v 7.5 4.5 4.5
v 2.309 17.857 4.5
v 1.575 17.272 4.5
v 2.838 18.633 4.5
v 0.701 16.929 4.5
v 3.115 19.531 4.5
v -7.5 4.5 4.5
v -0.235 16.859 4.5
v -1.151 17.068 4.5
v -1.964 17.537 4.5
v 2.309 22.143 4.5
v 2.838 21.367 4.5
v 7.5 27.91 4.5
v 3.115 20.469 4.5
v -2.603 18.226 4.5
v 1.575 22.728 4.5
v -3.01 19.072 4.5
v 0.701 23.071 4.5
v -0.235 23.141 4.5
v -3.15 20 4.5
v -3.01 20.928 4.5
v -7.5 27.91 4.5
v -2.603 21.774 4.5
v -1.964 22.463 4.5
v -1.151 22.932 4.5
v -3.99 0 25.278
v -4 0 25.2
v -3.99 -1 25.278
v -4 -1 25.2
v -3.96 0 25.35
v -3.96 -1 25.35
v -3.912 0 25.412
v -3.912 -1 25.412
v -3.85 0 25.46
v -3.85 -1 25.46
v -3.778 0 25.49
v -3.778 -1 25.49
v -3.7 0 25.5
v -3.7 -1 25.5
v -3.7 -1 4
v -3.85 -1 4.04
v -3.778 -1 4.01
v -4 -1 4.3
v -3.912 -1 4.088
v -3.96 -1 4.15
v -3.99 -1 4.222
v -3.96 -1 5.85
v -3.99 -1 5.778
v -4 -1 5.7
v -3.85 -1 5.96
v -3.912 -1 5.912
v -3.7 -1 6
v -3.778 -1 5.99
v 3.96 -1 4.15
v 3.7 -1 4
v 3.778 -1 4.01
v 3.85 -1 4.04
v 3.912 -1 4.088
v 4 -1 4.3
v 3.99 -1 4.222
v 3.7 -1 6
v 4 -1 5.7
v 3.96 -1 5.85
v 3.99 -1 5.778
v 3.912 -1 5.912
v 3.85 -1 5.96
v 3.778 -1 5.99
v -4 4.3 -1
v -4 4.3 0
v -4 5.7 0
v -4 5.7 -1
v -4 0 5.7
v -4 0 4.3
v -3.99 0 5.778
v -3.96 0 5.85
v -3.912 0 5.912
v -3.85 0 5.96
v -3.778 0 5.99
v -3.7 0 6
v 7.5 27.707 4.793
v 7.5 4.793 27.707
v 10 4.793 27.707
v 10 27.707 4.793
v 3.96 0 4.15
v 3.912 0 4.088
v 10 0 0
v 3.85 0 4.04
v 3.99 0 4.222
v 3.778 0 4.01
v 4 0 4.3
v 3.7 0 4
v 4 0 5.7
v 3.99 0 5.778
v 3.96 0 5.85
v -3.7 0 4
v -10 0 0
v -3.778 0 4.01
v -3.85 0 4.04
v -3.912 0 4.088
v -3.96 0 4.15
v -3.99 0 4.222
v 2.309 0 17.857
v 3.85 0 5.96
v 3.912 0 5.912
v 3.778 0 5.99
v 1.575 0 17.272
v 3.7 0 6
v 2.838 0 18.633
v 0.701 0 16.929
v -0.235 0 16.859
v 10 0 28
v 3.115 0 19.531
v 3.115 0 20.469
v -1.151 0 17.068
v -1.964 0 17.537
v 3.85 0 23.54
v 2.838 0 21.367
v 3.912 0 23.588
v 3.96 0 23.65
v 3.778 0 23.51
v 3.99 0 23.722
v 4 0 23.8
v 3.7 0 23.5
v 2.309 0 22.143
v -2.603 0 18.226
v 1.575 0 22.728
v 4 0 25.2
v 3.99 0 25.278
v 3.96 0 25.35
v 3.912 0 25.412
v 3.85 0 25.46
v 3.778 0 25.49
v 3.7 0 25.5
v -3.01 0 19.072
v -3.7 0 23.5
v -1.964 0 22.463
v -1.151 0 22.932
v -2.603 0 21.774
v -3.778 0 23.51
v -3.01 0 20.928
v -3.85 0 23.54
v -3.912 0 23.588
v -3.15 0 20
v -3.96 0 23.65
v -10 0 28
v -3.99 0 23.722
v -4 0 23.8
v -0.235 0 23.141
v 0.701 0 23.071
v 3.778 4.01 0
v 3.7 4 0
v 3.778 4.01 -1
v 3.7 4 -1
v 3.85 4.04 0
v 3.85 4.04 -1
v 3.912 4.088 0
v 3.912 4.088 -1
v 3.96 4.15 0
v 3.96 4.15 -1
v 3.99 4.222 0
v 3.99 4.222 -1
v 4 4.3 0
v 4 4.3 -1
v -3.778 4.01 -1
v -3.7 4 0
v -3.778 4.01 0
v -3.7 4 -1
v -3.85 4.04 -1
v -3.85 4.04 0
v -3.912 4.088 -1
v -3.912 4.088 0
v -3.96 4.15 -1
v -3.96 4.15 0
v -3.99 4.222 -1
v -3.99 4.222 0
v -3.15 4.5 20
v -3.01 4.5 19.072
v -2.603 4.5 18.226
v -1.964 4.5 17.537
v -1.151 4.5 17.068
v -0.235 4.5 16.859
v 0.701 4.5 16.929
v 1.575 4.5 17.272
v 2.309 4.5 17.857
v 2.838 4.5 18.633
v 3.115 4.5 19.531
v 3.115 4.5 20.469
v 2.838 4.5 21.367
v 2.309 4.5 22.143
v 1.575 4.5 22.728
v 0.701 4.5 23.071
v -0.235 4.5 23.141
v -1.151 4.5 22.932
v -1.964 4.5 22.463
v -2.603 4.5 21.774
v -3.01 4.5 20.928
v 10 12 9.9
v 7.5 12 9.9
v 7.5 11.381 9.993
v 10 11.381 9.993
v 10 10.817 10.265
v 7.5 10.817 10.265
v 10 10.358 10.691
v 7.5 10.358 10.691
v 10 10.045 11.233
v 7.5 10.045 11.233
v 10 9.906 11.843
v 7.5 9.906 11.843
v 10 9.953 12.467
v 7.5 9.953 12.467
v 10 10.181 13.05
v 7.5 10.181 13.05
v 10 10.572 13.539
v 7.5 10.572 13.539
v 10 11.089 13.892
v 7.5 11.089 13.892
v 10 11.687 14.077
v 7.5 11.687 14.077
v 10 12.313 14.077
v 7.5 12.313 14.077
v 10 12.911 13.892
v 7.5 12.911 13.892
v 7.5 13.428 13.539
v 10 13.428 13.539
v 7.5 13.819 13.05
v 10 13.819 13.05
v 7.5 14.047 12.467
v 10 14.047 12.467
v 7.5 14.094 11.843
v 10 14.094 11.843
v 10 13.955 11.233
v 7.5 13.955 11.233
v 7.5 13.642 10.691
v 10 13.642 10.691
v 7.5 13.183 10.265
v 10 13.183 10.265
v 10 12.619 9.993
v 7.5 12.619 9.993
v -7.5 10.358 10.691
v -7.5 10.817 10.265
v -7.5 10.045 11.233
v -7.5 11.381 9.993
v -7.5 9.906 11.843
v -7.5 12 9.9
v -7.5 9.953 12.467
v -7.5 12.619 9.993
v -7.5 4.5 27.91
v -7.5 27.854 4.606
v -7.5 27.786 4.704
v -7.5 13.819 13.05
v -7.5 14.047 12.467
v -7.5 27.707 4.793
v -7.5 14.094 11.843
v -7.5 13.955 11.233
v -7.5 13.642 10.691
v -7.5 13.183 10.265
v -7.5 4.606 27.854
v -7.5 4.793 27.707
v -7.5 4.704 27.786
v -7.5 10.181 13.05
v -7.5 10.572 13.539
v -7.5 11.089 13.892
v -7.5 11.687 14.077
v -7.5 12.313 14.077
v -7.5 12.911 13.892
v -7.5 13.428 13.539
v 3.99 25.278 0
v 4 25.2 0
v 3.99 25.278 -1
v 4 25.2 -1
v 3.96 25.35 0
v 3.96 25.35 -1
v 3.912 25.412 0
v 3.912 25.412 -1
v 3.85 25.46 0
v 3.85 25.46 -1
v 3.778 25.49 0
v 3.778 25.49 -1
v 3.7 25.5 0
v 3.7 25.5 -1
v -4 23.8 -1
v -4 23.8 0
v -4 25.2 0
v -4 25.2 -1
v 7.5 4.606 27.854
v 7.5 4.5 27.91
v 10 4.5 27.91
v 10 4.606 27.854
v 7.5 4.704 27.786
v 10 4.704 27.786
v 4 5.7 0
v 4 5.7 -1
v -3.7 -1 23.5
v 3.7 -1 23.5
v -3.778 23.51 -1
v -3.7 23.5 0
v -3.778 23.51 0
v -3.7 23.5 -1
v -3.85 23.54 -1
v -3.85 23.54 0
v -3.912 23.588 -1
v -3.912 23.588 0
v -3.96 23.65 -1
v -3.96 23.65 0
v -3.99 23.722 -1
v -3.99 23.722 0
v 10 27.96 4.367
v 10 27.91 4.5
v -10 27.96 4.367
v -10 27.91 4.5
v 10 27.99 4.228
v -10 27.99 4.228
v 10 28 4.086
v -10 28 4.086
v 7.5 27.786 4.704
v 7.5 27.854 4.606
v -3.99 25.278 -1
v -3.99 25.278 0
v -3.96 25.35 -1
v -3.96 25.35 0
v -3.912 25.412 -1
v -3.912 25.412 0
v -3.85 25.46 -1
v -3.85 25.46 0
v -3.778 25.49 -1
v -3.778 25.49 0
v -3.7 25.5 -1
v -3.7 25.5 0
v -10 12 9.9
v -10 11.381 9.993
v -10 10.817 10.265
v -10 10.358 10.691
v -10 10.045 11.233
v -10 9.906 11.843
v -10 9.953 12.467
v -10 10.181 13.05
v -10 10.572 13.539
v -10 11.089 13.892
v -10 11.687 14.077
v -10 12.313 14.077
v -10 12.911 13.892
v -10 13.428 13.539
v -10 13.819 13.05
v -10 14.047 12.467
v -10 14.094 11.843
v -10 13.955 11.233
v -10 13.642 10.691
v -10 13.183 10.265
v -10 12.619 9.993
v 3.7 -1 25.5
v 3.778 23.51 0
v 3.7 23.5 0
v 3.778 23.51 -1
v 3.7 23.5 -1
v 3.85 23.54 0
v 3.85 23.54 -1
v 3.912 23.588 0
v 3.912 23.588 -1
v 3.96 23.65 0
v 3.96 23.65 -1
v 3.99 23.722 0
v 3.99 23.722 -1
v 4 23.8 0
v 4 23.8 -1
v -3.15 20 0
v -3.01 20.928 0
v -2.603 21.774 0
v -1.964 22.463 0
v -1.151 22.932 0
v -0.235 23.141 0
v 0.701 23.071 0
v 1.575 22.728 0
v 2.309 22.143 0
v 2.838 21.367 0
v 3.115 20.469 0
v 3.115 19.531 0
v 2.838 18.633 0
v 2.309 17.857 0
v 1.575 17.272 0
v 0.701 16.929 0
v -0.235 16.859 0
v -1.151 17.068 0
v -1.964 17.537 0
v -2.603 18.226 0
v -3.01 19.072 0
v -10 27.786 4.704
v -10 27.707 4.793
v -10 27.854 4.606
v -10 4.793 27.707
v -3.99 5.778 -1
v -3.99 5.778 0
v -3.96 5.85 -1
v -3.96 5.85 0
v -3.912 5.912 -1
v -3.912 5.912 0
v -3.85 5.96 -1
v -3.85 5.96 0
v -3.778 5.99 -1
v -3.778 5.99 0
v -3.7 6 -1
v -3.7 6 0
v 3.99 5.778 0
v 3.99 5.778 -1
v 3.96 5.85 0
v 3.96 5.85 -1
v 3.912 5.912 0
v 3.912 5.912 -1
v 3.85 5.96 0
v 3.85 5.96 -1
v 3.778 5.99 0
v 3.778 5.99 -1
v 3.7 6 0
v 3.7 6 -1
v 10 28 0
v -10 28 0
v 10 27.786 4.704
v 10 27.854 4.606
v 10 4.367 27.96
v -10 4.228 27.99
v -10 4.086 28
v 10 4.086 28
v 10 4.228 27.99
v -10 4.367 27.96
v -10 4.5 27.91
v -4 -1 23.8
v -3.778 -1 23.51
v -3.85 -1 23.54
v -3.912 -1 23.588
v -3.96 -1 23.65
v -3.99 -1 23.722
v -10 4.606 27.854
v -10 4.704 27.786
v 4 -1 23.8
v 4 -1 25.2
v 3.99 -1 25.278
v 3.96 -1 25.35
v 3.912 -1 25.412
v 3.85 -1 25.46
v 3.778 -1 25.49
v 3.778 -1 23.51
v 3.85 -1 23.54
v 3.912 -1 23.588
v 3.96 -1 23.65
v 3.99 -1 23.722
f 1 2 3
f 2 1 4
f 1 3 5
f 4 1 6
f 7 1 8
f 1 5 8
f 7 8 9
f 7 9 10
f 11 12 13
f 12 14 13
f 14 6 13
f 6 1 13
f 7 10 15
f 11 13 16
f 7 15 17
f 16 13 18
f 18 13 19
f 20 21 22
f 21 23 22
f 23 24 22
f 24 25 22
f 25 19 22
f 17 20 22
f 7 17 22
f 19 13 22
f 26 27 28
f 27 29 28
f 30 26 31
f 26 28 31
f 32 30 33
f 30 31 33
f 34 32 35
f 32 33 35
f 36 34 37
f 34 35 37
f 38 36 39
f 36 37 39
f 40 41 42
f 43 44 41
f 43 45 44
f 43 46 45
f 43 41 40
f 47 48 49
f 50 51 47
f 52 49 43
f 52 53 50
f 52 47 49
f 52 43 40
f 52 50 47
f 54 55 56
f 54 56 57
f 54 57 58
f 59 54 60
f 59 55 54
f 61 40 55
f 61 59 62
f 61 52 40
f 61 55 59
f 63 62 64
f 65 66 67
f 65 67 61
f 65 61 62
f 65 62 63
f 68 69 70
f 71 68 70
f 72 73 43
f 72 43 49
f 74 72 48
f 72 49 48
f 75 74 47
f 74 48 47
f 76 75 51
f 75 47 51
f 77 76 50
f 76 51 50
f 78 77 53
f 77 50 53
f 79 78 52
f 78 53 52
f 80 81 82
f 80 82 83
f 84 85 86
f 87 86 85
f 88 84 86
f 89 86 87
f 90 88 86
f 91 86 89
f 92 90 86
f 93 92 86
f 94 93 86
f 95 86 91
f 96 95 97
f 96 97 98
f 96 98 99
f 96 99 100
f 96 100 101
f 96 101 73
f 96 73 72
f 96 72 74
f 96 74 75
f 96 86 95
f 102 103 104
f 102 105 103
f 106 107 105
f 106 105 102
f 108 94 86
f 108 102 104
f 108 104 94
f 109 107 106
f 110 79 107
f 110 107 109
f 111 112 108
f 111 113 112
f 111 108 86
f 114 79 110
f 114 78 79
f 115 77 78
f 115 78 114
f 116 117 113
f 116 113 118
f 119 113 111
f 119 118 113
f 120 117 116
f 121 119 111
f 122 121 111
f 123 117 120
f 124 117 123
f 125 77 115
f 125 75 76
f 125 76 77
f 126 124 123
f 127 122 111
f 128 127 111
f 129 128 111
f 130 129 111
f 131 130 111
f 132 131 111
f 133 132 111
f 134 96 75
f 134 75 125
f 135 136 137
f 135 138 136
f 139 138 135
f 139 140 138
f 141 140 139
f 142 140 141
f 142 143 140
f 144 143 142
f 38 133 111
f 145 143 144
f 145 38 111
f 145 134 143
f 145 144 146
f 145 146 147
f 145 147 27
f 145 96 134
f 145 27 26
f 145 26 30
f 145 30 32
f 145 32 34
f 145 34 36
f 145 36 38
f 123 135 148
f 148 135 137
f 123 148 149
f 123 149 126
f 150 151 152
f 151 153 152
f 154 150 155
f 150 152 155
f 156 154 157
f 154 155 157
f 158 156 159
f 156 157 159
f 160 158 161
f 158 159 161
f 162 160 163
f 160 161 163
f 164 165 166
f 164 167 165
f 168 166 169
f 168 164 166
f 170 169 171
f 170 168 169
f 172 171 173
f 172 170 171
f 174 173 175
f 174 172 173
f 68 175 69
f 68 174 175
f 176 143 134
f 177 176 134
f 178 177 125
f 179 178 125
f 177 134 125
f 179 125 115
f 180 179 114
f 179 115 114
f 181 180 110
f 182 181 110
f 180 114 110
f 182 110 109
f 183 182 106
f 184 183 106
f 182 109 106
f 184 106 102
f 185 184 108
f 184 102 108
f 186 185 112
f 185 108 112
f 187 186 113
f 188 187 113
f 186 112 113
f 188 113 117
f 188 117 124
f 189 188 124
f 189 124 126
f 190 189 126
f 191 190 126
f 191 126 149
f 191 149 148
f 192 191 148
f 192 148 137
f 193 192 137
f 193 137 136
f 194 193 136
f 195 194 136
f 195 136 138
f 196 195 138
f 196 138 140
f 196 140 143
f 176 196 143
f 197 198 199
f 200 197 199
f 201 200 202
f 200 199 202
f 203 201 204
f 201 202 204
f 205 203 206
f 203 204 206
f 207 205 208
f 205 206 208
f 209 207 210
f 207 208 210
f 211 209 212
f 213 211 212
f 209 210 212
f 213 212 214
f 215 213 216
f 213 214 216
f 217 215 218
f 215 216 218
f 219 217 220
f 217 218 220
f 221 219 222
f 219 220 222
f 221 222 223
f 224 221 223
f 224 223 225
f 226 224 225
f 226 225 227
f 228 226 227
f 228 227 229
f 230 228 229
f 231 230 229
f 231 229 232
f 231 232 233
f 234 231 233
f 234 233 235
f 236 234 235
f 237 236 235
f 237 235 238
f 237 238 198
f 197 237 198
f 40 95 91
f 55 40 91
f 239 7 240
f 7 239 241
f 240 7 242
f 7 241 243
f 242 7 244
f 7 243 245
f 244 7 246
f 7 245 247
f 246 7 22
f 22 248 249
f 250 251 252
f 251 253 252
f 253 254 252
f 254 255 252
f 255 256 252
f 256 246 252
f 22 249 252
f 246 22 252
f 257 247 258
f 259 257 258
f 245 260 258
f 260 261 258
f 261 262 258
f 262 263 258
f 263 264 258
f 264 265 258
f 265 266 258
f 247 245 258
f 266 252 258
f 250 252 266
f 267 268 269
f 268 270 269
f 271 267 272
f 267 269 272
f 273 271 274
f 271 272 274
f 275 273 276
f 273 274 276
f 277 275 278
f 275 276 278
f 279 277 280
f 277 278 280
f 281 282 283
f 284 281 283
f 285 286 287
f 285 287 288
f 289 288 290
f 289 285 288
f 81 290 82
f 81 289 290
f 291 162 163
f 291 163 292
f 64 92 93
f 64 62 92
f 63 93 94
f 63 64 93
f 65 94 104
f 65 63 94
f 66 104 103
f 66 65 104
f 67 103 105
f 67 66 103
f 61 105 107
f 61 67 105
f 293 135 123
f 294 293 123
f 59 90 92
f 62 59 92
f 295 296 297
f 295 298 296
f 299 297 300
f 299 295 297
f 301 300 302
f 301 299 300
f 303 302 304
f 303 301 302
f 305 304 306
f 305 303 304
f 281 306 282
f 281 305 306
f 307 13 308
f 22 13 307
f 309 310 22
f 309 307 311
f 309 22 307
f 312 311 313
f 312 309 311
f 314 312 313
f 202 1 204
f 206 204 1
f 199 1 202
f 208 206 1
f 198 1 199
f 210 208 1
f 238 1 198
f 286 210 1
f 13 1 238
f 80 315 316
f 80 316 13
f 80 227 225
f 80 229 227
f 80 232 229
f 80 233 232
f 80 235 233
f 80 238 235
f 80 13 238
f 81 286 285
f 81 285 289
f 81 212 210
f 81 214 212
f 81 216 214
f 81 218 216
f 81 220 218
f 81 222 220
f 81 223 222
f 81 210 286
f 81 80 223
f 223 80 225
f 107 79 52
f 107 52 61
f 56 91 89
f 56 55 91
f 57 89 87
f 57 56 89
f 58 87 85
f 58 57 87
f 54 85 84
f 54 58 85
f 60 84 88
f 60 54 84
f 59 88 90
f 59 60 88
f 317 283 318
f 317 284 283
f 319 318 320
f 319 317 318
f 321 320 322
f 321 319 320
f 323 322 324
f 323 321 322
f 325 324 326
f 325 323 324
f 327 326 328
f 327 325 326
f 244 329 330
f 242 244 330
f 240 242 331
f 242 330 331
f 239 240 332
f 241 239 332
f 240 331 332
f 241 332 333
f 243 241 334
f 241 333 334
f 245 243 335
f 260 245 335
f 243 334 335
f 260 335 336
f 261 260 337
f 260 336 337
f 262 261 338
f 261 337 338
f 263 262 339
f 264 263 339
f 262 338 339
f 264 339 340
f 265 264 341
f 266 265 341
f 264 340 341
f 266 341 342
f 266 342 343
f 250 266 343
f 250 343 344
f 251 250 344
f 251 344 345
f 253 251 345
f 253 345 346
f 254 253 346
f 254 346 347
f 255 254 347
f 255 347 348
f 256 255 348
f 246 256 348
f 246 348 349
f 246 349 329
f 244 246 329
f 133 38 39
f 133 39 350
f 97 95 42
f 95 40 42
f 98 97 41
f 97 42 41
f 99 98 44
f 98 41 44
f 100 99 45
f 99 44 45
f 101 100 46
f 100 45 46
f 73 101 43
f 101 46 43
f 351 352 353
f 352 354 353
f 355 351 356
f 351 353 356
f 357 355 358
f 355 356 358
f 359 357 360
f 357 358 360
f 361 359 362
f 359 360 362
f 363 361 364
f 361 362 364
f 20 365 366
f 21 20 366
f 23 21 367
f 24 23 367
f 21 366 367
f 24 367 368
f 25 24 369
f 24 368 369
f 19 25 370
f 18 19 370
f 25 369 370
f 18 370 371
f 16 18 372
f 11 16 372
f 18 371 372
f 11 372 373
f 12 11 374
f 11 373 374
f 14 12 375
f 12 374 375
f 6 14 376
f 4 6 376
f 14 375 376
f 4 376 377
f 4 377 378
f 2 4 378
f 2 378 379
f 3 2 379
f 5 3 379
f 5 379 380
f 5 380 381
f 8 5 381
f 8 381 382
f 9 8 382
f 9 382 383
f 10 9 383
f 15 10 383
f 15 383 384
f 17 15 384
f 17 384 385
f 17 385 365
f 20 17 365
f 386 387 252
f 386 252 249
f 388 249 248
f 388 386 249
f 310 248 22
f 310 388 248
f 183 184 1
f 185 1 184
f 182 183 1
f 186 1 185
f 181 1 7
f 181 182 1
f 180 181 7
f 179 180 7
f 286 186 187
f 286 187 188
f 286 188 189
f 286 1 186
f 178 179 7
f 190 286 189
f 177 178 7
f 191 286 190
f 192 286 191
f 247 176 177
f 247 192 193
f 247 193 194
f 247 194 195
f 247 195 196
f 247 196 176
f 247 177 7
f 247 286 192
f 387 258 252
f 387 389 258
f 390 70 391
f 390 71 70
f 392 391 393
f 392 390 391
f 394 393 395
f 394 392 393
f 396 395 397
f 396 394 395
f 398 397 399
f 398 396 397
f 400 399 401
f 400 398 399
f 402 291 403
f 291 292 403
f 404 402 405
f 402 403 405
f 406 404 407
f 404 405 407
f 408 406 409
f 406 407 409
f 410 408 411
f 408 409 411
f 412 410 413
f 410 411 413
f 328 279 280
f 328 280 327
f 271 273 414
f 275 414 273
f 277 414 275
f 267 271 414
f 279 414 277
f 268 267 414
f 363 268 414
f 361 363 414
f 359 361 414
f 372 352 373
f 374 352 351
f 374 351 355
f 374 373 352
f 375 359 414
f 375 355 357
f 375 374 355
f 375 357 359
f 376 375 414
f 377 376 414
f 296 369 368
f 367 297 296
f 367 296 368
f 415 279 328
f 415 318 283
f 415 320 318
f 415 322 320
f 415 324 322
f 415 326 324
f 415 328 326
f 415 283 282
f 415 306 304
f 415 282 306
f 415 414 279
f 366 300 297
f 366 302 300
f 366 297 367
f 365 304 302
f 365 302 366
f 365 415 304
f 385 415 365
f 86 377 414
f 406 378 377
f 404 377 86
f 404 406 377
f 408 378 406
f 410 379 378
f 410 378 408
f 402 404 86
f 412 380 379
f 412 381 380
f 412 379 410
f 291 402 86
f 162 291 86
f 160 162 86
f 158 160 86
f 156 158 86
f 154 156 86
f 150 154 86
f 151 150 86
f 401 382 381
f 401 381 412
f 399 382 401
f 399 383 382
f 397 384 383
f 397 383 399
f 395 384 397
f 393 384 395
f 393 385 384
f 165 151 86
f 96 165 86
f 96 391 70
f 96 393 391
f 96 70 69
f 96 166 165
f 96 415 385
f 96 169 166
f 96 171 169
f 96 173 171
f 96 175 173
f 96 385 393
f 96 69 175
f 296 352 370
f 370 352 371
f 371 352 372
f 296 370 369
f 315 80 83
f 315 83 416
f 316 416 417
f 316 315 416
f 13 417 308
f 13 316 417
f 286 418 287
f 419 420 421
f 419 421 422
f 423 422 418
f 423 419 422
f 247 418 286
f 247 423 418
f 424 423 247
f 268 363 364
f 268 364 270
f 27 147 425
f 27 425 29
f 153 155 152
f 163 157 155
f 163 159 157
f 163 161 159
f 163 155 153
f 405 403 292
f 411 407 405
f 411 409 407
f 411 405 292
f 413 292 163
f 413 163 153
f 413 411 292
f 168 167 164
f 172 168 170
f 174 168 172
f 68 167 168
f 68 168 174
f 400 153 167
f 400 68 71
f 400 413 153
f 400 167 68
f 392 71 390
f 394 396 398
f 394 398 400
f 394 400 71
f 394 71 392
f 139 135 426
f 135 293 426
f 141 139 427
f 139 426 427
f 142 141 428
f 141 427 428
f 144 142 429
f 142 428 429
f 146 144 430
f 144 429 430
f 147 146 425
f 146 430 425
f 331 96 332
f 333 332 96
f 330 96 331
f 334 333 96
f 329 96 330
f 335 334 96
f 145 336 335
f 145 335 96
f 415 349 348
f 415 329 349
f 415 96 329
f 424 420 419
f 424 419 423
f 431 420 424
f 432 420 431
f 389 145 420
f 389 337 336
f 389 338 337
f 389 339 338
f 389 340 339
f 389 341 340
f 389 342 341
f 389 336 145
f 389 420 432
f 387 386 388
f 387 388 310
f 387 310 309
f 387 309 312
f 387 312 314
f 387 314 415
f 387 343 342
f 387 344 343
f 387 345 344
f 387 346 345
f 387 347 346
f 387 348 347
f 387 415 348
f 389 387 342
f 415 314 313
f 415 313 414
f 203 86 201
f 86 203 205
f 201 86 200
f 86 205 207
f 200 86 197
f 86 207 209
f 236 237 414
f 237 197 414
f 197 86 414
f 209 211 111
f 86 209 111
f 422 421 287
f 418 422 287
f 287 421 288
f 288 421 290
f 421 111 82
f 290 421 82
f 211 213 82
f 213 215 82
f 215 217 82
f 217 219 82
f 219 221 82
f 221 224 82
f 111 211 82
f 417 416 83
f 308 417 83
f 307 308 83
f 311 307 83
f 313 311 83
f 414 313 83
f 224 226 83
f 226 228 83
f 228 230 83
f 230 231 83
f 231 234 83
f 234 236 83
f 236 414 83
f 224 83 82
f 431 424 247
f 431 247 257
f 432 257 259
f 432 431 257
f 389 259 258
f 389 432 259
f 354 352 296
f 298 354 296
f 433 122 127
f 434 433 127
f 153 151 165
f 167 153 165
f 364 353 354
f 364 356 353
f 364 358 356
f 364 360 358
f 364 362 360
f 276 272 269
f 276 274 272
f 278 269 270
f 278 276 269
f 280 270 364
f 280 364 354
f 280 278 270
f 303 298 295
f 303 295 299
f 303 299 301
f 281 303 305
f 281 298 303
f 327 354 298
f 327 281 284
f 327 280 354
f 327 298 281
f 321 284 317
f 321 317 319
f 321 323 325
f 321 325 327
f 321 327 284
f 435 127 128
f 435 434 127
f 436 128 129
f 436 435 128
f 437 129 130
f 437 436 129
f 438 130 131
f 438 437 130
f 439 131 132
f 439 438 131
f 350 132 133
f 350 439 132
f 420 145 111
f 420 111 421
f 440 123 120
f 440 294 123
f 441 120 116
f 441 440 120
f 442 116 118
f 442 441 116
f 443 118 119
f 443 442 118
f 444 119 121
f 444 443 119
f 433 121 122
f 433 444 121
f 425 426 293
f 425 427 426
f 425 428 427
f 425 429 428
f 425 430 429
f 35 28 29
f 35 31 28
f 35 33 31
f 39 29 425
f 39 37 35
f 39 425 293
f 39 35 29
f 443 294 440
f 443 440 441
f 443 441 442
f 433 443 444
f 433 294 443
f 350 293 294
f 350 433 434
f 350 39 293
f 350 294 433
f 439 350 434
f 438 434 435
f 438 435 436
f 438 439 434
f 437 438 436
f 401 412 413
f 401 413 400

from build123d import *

# Parameters (mm, degrees)
ESTRUSIONE_ESTRUSIONE1_DEPTH = 2.5
SCHIZZO2_W                   = 15
SCHIZZO2_H                   = 23.5
ESTRUSIONE_ESTRUSIONE2_DEPTH = 23.5
SCHIZZO3_W                   = 17.5
SCHIZZO3_H                   = 23.5
ESTRUSIONE_ESTRUSIONE3_DEPTH = 4.5
SCHIZZO4_W                   = 17.5
SCHIZZO4_H                   = 28
ESTRUSIONE_ESTRUSIONE4_DEPTH = 4.5
SCHIZZO5_W                   = 15
SCHIZZO5_H                   = 23.5
TAGLIO_ESTRUSIONE1_DEPTH     = 23.5
ESTRUSIONE_ESTRUSIONE5_DEPTH = 2.5
SCHIZZO7_W                   = 8
SCHIZZO7_H                   = 2
ESTRUSIONE_ESTRUSIONE6_DEPTH = 1
SCHIZZO8_W                   = 8
SCHIZZO8_H                   = 2
ESTRUSIONE_ESTRUSIONE7_DEPTH = 1
SCHIZZO9_W                   = 8
SCHIZZO9_H                   = 2
ESTRUSIONE_ESTRUSIONE8_DEPTH = 1
SCHIZZO10_W                  = 8
SCHIZZO10_H                  = 2
ESTRUSIONE_ESTRUSIONE9_DEPTH = 1
FORO_6_3_6_3_1_D             = 6.3
FORO_6_3_6_3_1_DEPTH         = 5.5
FORO_6_3_6_3_2_D             = 6.3
FORO_6_3_6_3_2_DEPTH         = 5.5
RACCORDO1_R                  = 0.3
RACCORDO2_START              = -11
RACCORDO2_DEPTH              = 22
FORO_FILETTATO_M5_1_D        = 4.2


with BuildPart() as part:
    # Schizzo1 → Estrusione-Estrusione1 (new body)
    with BuildSketch(Plane(origin=(-10, 0, 0), x_dir=(0, -1, 0), z_dir=(-1, 0, 0))):
        with BuildLine():
            Line((-27.707106781, 4.792893219), (-28, 4.5))
            Line((-28, 4.5), (-4.5, 4.5))
            Line((-4.5, 4.5), (-4.5, 28))
            Line((-4.5, 28), (-4.792893219, 27.707106781))
            add(Edge.make_bspline(
                [(-4.792893219, 27.707106781), (-12.430964406, 20.069035594), (-20.069035594, 12.430964406), (-27.707106781, 4.792893219)],
                knots=[0, 0, 0, 0, 1, 1, 1, 1], degree=3))
        make_face()
    extrude(amount=-ESTRUSIONE_ESTRUSIONE1_DEPTH)

    # Schizzo2 → Estrusione-Estrusione2 (add)
    with BuildSketch(Plane(origin=(0, 0, 4.5), x_dir=(-1, 0, 0), z_dir=(0, 0, -1))):
        with Locations((0, 16.25)):
            Rectangle(SCHIZZO2_W, SCHIZZO2_H)
    extrude(amount=-ESTRUSIONE_ESTRUSIONE2_DEPTH)

    # Schizzo3 → Estrusione-Estrusione3 (add)
    with BuildSketch(Plane(origin=(0, 0, 4.5), x_dir=(-1, 0, 0), z_dir=(0, 0, -1))):
        with Locations((1.25, 16.25)):
            Rectangle(SCHIZZO3_W, SCHIZZO3_H)
    extrude(amount=ESTRUSIONE_ESTRUSIONE3_DEPTH)

    # Schizzo4 → Estrusione-Estrusione4 (add)
    with BuildSketch(Plane.XZ.offset(-4.5)):
        with Locations((-1.25, 14)):
            Rectangle(SCHIZZO4_W, SCHIZZO4_H)
    extrude(amount=ESTRUSIONE_ESTRUSIONE4_DEPTH)

    # Schizzo5 → Taglio-Estrusione1 (cut)
    with BuildSketch(Plane(origin=(0, 28, 0), x_dir=(-1, 0, 0), z_dir=(0, 1, 0))):
        with Locations((0, 16.25)):
            Rectangle(SCHIZZO5_W, SCHIZZO5_H)
    extrude(amount=-TAGLIO_ESTRUSIONE1_DEPTH, mode=Mode.SUBTRACT)

    # Schizzo6 → Estrusione-Estrusione5 (add)
    with BuildSketch(Plane(origin=(7.5, 0, 0), x_dir=(0, 0, -1), z_dir=(1, 0, 0))):
        with BuildLine():
            Line((-28, 0), (-28, 4.5))
            Line((-28, 4.5), (-27.707106492, 4.792893508))
            add(Edge.make_bspline(
                [(-4.792893219, 27.707106781), (-12.43096431, 20.06903569), (-20.069035401, 12.430964599), (-27.707106492, 4.792893508)],
                knots=[0, 0, 0, 0, 1, 1, 1, 1], degree=3))
            Line((-4.792893219, 27.707106781), (-4.5, 28))
            Line((-4.5, 28), (0, 28))
            Line((0, 28), (0, 0))
            Line((0, 0), (-28, 0))
        make_face()
    extrude(amount=ESTRUSIONE_ESTRUSIONE5_DEPTH)

    # Schizzo7 → Estrusione-Estrusione6 (add)
    with BuildSketch(Plane(origin=(0, 0, 0), x_dir=(-1, 0, 0), z_dir=(0, 0, -1))):
        with Locations((0, 5)):
            Rectangle(SCHIZZO7_W, SCHIZZO7_H)
    extrude(amount=ESTRUSIONE_ESTRUSIONE6_DEPTH)

    # Schizzo8 → Estrusione-Estrusione7 (add)
    with BuildSketch(Plane(origin=(0, 0, 0), x_dir=(-1, 0, 0), z_dir=(0, 0, -1))):
        with Locations((0, 24.5)):
            Rectangle(SCHIZZO8_W, SCHIZZO8_H)
    extrude(amount=ESTRUSIONE_ESTRUSIONE7_DEPTH)

    # Schizzo9 → Estrusione-Estrusione8 (add)
    with BuildSketch(Plane.XZ):
        with Locations((0, 24.5)):
            Rectangle(SCHIZZO9_W, SCHIZZO9_H)
    extrude(amount=ESTRUSIONE_ESTRUSIONE8_DEPTH)

    # Schizzo10 → Estrusione-Estrusione9 (add)
    with BuildSketch(Plane.XZ):
        with Locations((0, 5)):
            Rectangle(SCHIZZO10_W, SCHIZZO10_H)
    extrude(amount=ESTRUSIONE_ESTRUSIONE9_DEPTH)

    # Foro Ø6.3 (6.3)-1
    with Locations(Plane(origin=(0, 4.5, 0), x_dir=(1, 0, 0), z_dir=(0, 1, 0))):
        with Locations((0, -20)):
            Hole(FORO_6_3_6_3_1_D / 2, depth=FORO_6_3_6_3_1_DEPTH)

    # Foro Ø6.3 (6.3)-2
    with Locations(Plane.XY.offset(4.5)):
        with Locations((0, 20)):
            Hole(FORO_6_3_6_3_2_D / 2, depth=FORO_6_3_6_3_2_DEPTH)

    # Raccordo1
    raccordo1_edges = [part.edges().sort_by_distance(p)[0] for p in [
        (-4, 23.5, -0.5),
        (-4, 25.5, -0.5),
        (4, 25.5, -0.5),
        (4, 23.5, -0.5),
        (4, -0.5, 25.5),
        (-4, -0.5, 25.5),
        (-4, -0.5, 23.5),
        (4, -0.5, 23.5),
        (4, -0.5, 6),
        (-4, -0.5, 6),
        (-4, -0.5, 4),
        (4, -0.5, 4),
        (-4, 4, -0.5),
        (-4, 6, -0.5),
        (4, 6, -0.5),
        (4, 4, -0.5),
    ]]
    fillet(raccordo1_edges, radius=RACCORDO1_R)

    # Raccordo2: read off the stored shape, not the designer's step
    # Raccordo2 outline → Raccordo2 (cut)
    with BuildSketch(Plane.YZ.offset(RACCORDO2_START)):
        with BuildLine():
            ThreePointArc((4.5, 27.910179721), (4.655566811, 27.82179701), (4.792893508, 27.707106492))
            Line((4.792893508, 27.707106492), (4.5, 28))
            Line((4.5, 28), (4.5, 27.910179721))
        make_face()
        with BuildLine():
            ThreePointArc((4.085786438, 28), (4.297706563, 27.97728699), (4.5, 27.910179721))
            Line((4.5, 27.910179721), (4.5, 28))
            Line((4.5, 28), (4.085786438, 28))
        make_face()
        with BuildLine():
            Line((28, 4.5), (27.707106781, 4.792893219))
            ThreePointArc((27.707106781, 4.792893219), (27.821797127, 4.655566644), (27.910179722, 4.5))
            Line((27.910179722, 4.5), (28, 4.5))
        make_face()
        with BuildLine():
            Line((28, 4.5), (27.910179722, 4.5))
            ThreePointArc((27.910179722, 4.5), (27.97728699, 4.297706563), (28, 4.085786438))
            Line((28, 4.085786438), (28, 4.5))
        make_face()
    extrude(amount=RACCORDO2_DEPTH, mode=Mode.SUBTRACT)

    # Foro filettato M5-1 (through all)
    with Locations(Plane(origin=(10, 12, 12), x_dir=(0, 0, 1), z_dir=(1, 0, 0))):
        with Locations((0, 0)):
            Hole(FORO_FILETTATO_M5_1_D / 2)


solid = part.part
